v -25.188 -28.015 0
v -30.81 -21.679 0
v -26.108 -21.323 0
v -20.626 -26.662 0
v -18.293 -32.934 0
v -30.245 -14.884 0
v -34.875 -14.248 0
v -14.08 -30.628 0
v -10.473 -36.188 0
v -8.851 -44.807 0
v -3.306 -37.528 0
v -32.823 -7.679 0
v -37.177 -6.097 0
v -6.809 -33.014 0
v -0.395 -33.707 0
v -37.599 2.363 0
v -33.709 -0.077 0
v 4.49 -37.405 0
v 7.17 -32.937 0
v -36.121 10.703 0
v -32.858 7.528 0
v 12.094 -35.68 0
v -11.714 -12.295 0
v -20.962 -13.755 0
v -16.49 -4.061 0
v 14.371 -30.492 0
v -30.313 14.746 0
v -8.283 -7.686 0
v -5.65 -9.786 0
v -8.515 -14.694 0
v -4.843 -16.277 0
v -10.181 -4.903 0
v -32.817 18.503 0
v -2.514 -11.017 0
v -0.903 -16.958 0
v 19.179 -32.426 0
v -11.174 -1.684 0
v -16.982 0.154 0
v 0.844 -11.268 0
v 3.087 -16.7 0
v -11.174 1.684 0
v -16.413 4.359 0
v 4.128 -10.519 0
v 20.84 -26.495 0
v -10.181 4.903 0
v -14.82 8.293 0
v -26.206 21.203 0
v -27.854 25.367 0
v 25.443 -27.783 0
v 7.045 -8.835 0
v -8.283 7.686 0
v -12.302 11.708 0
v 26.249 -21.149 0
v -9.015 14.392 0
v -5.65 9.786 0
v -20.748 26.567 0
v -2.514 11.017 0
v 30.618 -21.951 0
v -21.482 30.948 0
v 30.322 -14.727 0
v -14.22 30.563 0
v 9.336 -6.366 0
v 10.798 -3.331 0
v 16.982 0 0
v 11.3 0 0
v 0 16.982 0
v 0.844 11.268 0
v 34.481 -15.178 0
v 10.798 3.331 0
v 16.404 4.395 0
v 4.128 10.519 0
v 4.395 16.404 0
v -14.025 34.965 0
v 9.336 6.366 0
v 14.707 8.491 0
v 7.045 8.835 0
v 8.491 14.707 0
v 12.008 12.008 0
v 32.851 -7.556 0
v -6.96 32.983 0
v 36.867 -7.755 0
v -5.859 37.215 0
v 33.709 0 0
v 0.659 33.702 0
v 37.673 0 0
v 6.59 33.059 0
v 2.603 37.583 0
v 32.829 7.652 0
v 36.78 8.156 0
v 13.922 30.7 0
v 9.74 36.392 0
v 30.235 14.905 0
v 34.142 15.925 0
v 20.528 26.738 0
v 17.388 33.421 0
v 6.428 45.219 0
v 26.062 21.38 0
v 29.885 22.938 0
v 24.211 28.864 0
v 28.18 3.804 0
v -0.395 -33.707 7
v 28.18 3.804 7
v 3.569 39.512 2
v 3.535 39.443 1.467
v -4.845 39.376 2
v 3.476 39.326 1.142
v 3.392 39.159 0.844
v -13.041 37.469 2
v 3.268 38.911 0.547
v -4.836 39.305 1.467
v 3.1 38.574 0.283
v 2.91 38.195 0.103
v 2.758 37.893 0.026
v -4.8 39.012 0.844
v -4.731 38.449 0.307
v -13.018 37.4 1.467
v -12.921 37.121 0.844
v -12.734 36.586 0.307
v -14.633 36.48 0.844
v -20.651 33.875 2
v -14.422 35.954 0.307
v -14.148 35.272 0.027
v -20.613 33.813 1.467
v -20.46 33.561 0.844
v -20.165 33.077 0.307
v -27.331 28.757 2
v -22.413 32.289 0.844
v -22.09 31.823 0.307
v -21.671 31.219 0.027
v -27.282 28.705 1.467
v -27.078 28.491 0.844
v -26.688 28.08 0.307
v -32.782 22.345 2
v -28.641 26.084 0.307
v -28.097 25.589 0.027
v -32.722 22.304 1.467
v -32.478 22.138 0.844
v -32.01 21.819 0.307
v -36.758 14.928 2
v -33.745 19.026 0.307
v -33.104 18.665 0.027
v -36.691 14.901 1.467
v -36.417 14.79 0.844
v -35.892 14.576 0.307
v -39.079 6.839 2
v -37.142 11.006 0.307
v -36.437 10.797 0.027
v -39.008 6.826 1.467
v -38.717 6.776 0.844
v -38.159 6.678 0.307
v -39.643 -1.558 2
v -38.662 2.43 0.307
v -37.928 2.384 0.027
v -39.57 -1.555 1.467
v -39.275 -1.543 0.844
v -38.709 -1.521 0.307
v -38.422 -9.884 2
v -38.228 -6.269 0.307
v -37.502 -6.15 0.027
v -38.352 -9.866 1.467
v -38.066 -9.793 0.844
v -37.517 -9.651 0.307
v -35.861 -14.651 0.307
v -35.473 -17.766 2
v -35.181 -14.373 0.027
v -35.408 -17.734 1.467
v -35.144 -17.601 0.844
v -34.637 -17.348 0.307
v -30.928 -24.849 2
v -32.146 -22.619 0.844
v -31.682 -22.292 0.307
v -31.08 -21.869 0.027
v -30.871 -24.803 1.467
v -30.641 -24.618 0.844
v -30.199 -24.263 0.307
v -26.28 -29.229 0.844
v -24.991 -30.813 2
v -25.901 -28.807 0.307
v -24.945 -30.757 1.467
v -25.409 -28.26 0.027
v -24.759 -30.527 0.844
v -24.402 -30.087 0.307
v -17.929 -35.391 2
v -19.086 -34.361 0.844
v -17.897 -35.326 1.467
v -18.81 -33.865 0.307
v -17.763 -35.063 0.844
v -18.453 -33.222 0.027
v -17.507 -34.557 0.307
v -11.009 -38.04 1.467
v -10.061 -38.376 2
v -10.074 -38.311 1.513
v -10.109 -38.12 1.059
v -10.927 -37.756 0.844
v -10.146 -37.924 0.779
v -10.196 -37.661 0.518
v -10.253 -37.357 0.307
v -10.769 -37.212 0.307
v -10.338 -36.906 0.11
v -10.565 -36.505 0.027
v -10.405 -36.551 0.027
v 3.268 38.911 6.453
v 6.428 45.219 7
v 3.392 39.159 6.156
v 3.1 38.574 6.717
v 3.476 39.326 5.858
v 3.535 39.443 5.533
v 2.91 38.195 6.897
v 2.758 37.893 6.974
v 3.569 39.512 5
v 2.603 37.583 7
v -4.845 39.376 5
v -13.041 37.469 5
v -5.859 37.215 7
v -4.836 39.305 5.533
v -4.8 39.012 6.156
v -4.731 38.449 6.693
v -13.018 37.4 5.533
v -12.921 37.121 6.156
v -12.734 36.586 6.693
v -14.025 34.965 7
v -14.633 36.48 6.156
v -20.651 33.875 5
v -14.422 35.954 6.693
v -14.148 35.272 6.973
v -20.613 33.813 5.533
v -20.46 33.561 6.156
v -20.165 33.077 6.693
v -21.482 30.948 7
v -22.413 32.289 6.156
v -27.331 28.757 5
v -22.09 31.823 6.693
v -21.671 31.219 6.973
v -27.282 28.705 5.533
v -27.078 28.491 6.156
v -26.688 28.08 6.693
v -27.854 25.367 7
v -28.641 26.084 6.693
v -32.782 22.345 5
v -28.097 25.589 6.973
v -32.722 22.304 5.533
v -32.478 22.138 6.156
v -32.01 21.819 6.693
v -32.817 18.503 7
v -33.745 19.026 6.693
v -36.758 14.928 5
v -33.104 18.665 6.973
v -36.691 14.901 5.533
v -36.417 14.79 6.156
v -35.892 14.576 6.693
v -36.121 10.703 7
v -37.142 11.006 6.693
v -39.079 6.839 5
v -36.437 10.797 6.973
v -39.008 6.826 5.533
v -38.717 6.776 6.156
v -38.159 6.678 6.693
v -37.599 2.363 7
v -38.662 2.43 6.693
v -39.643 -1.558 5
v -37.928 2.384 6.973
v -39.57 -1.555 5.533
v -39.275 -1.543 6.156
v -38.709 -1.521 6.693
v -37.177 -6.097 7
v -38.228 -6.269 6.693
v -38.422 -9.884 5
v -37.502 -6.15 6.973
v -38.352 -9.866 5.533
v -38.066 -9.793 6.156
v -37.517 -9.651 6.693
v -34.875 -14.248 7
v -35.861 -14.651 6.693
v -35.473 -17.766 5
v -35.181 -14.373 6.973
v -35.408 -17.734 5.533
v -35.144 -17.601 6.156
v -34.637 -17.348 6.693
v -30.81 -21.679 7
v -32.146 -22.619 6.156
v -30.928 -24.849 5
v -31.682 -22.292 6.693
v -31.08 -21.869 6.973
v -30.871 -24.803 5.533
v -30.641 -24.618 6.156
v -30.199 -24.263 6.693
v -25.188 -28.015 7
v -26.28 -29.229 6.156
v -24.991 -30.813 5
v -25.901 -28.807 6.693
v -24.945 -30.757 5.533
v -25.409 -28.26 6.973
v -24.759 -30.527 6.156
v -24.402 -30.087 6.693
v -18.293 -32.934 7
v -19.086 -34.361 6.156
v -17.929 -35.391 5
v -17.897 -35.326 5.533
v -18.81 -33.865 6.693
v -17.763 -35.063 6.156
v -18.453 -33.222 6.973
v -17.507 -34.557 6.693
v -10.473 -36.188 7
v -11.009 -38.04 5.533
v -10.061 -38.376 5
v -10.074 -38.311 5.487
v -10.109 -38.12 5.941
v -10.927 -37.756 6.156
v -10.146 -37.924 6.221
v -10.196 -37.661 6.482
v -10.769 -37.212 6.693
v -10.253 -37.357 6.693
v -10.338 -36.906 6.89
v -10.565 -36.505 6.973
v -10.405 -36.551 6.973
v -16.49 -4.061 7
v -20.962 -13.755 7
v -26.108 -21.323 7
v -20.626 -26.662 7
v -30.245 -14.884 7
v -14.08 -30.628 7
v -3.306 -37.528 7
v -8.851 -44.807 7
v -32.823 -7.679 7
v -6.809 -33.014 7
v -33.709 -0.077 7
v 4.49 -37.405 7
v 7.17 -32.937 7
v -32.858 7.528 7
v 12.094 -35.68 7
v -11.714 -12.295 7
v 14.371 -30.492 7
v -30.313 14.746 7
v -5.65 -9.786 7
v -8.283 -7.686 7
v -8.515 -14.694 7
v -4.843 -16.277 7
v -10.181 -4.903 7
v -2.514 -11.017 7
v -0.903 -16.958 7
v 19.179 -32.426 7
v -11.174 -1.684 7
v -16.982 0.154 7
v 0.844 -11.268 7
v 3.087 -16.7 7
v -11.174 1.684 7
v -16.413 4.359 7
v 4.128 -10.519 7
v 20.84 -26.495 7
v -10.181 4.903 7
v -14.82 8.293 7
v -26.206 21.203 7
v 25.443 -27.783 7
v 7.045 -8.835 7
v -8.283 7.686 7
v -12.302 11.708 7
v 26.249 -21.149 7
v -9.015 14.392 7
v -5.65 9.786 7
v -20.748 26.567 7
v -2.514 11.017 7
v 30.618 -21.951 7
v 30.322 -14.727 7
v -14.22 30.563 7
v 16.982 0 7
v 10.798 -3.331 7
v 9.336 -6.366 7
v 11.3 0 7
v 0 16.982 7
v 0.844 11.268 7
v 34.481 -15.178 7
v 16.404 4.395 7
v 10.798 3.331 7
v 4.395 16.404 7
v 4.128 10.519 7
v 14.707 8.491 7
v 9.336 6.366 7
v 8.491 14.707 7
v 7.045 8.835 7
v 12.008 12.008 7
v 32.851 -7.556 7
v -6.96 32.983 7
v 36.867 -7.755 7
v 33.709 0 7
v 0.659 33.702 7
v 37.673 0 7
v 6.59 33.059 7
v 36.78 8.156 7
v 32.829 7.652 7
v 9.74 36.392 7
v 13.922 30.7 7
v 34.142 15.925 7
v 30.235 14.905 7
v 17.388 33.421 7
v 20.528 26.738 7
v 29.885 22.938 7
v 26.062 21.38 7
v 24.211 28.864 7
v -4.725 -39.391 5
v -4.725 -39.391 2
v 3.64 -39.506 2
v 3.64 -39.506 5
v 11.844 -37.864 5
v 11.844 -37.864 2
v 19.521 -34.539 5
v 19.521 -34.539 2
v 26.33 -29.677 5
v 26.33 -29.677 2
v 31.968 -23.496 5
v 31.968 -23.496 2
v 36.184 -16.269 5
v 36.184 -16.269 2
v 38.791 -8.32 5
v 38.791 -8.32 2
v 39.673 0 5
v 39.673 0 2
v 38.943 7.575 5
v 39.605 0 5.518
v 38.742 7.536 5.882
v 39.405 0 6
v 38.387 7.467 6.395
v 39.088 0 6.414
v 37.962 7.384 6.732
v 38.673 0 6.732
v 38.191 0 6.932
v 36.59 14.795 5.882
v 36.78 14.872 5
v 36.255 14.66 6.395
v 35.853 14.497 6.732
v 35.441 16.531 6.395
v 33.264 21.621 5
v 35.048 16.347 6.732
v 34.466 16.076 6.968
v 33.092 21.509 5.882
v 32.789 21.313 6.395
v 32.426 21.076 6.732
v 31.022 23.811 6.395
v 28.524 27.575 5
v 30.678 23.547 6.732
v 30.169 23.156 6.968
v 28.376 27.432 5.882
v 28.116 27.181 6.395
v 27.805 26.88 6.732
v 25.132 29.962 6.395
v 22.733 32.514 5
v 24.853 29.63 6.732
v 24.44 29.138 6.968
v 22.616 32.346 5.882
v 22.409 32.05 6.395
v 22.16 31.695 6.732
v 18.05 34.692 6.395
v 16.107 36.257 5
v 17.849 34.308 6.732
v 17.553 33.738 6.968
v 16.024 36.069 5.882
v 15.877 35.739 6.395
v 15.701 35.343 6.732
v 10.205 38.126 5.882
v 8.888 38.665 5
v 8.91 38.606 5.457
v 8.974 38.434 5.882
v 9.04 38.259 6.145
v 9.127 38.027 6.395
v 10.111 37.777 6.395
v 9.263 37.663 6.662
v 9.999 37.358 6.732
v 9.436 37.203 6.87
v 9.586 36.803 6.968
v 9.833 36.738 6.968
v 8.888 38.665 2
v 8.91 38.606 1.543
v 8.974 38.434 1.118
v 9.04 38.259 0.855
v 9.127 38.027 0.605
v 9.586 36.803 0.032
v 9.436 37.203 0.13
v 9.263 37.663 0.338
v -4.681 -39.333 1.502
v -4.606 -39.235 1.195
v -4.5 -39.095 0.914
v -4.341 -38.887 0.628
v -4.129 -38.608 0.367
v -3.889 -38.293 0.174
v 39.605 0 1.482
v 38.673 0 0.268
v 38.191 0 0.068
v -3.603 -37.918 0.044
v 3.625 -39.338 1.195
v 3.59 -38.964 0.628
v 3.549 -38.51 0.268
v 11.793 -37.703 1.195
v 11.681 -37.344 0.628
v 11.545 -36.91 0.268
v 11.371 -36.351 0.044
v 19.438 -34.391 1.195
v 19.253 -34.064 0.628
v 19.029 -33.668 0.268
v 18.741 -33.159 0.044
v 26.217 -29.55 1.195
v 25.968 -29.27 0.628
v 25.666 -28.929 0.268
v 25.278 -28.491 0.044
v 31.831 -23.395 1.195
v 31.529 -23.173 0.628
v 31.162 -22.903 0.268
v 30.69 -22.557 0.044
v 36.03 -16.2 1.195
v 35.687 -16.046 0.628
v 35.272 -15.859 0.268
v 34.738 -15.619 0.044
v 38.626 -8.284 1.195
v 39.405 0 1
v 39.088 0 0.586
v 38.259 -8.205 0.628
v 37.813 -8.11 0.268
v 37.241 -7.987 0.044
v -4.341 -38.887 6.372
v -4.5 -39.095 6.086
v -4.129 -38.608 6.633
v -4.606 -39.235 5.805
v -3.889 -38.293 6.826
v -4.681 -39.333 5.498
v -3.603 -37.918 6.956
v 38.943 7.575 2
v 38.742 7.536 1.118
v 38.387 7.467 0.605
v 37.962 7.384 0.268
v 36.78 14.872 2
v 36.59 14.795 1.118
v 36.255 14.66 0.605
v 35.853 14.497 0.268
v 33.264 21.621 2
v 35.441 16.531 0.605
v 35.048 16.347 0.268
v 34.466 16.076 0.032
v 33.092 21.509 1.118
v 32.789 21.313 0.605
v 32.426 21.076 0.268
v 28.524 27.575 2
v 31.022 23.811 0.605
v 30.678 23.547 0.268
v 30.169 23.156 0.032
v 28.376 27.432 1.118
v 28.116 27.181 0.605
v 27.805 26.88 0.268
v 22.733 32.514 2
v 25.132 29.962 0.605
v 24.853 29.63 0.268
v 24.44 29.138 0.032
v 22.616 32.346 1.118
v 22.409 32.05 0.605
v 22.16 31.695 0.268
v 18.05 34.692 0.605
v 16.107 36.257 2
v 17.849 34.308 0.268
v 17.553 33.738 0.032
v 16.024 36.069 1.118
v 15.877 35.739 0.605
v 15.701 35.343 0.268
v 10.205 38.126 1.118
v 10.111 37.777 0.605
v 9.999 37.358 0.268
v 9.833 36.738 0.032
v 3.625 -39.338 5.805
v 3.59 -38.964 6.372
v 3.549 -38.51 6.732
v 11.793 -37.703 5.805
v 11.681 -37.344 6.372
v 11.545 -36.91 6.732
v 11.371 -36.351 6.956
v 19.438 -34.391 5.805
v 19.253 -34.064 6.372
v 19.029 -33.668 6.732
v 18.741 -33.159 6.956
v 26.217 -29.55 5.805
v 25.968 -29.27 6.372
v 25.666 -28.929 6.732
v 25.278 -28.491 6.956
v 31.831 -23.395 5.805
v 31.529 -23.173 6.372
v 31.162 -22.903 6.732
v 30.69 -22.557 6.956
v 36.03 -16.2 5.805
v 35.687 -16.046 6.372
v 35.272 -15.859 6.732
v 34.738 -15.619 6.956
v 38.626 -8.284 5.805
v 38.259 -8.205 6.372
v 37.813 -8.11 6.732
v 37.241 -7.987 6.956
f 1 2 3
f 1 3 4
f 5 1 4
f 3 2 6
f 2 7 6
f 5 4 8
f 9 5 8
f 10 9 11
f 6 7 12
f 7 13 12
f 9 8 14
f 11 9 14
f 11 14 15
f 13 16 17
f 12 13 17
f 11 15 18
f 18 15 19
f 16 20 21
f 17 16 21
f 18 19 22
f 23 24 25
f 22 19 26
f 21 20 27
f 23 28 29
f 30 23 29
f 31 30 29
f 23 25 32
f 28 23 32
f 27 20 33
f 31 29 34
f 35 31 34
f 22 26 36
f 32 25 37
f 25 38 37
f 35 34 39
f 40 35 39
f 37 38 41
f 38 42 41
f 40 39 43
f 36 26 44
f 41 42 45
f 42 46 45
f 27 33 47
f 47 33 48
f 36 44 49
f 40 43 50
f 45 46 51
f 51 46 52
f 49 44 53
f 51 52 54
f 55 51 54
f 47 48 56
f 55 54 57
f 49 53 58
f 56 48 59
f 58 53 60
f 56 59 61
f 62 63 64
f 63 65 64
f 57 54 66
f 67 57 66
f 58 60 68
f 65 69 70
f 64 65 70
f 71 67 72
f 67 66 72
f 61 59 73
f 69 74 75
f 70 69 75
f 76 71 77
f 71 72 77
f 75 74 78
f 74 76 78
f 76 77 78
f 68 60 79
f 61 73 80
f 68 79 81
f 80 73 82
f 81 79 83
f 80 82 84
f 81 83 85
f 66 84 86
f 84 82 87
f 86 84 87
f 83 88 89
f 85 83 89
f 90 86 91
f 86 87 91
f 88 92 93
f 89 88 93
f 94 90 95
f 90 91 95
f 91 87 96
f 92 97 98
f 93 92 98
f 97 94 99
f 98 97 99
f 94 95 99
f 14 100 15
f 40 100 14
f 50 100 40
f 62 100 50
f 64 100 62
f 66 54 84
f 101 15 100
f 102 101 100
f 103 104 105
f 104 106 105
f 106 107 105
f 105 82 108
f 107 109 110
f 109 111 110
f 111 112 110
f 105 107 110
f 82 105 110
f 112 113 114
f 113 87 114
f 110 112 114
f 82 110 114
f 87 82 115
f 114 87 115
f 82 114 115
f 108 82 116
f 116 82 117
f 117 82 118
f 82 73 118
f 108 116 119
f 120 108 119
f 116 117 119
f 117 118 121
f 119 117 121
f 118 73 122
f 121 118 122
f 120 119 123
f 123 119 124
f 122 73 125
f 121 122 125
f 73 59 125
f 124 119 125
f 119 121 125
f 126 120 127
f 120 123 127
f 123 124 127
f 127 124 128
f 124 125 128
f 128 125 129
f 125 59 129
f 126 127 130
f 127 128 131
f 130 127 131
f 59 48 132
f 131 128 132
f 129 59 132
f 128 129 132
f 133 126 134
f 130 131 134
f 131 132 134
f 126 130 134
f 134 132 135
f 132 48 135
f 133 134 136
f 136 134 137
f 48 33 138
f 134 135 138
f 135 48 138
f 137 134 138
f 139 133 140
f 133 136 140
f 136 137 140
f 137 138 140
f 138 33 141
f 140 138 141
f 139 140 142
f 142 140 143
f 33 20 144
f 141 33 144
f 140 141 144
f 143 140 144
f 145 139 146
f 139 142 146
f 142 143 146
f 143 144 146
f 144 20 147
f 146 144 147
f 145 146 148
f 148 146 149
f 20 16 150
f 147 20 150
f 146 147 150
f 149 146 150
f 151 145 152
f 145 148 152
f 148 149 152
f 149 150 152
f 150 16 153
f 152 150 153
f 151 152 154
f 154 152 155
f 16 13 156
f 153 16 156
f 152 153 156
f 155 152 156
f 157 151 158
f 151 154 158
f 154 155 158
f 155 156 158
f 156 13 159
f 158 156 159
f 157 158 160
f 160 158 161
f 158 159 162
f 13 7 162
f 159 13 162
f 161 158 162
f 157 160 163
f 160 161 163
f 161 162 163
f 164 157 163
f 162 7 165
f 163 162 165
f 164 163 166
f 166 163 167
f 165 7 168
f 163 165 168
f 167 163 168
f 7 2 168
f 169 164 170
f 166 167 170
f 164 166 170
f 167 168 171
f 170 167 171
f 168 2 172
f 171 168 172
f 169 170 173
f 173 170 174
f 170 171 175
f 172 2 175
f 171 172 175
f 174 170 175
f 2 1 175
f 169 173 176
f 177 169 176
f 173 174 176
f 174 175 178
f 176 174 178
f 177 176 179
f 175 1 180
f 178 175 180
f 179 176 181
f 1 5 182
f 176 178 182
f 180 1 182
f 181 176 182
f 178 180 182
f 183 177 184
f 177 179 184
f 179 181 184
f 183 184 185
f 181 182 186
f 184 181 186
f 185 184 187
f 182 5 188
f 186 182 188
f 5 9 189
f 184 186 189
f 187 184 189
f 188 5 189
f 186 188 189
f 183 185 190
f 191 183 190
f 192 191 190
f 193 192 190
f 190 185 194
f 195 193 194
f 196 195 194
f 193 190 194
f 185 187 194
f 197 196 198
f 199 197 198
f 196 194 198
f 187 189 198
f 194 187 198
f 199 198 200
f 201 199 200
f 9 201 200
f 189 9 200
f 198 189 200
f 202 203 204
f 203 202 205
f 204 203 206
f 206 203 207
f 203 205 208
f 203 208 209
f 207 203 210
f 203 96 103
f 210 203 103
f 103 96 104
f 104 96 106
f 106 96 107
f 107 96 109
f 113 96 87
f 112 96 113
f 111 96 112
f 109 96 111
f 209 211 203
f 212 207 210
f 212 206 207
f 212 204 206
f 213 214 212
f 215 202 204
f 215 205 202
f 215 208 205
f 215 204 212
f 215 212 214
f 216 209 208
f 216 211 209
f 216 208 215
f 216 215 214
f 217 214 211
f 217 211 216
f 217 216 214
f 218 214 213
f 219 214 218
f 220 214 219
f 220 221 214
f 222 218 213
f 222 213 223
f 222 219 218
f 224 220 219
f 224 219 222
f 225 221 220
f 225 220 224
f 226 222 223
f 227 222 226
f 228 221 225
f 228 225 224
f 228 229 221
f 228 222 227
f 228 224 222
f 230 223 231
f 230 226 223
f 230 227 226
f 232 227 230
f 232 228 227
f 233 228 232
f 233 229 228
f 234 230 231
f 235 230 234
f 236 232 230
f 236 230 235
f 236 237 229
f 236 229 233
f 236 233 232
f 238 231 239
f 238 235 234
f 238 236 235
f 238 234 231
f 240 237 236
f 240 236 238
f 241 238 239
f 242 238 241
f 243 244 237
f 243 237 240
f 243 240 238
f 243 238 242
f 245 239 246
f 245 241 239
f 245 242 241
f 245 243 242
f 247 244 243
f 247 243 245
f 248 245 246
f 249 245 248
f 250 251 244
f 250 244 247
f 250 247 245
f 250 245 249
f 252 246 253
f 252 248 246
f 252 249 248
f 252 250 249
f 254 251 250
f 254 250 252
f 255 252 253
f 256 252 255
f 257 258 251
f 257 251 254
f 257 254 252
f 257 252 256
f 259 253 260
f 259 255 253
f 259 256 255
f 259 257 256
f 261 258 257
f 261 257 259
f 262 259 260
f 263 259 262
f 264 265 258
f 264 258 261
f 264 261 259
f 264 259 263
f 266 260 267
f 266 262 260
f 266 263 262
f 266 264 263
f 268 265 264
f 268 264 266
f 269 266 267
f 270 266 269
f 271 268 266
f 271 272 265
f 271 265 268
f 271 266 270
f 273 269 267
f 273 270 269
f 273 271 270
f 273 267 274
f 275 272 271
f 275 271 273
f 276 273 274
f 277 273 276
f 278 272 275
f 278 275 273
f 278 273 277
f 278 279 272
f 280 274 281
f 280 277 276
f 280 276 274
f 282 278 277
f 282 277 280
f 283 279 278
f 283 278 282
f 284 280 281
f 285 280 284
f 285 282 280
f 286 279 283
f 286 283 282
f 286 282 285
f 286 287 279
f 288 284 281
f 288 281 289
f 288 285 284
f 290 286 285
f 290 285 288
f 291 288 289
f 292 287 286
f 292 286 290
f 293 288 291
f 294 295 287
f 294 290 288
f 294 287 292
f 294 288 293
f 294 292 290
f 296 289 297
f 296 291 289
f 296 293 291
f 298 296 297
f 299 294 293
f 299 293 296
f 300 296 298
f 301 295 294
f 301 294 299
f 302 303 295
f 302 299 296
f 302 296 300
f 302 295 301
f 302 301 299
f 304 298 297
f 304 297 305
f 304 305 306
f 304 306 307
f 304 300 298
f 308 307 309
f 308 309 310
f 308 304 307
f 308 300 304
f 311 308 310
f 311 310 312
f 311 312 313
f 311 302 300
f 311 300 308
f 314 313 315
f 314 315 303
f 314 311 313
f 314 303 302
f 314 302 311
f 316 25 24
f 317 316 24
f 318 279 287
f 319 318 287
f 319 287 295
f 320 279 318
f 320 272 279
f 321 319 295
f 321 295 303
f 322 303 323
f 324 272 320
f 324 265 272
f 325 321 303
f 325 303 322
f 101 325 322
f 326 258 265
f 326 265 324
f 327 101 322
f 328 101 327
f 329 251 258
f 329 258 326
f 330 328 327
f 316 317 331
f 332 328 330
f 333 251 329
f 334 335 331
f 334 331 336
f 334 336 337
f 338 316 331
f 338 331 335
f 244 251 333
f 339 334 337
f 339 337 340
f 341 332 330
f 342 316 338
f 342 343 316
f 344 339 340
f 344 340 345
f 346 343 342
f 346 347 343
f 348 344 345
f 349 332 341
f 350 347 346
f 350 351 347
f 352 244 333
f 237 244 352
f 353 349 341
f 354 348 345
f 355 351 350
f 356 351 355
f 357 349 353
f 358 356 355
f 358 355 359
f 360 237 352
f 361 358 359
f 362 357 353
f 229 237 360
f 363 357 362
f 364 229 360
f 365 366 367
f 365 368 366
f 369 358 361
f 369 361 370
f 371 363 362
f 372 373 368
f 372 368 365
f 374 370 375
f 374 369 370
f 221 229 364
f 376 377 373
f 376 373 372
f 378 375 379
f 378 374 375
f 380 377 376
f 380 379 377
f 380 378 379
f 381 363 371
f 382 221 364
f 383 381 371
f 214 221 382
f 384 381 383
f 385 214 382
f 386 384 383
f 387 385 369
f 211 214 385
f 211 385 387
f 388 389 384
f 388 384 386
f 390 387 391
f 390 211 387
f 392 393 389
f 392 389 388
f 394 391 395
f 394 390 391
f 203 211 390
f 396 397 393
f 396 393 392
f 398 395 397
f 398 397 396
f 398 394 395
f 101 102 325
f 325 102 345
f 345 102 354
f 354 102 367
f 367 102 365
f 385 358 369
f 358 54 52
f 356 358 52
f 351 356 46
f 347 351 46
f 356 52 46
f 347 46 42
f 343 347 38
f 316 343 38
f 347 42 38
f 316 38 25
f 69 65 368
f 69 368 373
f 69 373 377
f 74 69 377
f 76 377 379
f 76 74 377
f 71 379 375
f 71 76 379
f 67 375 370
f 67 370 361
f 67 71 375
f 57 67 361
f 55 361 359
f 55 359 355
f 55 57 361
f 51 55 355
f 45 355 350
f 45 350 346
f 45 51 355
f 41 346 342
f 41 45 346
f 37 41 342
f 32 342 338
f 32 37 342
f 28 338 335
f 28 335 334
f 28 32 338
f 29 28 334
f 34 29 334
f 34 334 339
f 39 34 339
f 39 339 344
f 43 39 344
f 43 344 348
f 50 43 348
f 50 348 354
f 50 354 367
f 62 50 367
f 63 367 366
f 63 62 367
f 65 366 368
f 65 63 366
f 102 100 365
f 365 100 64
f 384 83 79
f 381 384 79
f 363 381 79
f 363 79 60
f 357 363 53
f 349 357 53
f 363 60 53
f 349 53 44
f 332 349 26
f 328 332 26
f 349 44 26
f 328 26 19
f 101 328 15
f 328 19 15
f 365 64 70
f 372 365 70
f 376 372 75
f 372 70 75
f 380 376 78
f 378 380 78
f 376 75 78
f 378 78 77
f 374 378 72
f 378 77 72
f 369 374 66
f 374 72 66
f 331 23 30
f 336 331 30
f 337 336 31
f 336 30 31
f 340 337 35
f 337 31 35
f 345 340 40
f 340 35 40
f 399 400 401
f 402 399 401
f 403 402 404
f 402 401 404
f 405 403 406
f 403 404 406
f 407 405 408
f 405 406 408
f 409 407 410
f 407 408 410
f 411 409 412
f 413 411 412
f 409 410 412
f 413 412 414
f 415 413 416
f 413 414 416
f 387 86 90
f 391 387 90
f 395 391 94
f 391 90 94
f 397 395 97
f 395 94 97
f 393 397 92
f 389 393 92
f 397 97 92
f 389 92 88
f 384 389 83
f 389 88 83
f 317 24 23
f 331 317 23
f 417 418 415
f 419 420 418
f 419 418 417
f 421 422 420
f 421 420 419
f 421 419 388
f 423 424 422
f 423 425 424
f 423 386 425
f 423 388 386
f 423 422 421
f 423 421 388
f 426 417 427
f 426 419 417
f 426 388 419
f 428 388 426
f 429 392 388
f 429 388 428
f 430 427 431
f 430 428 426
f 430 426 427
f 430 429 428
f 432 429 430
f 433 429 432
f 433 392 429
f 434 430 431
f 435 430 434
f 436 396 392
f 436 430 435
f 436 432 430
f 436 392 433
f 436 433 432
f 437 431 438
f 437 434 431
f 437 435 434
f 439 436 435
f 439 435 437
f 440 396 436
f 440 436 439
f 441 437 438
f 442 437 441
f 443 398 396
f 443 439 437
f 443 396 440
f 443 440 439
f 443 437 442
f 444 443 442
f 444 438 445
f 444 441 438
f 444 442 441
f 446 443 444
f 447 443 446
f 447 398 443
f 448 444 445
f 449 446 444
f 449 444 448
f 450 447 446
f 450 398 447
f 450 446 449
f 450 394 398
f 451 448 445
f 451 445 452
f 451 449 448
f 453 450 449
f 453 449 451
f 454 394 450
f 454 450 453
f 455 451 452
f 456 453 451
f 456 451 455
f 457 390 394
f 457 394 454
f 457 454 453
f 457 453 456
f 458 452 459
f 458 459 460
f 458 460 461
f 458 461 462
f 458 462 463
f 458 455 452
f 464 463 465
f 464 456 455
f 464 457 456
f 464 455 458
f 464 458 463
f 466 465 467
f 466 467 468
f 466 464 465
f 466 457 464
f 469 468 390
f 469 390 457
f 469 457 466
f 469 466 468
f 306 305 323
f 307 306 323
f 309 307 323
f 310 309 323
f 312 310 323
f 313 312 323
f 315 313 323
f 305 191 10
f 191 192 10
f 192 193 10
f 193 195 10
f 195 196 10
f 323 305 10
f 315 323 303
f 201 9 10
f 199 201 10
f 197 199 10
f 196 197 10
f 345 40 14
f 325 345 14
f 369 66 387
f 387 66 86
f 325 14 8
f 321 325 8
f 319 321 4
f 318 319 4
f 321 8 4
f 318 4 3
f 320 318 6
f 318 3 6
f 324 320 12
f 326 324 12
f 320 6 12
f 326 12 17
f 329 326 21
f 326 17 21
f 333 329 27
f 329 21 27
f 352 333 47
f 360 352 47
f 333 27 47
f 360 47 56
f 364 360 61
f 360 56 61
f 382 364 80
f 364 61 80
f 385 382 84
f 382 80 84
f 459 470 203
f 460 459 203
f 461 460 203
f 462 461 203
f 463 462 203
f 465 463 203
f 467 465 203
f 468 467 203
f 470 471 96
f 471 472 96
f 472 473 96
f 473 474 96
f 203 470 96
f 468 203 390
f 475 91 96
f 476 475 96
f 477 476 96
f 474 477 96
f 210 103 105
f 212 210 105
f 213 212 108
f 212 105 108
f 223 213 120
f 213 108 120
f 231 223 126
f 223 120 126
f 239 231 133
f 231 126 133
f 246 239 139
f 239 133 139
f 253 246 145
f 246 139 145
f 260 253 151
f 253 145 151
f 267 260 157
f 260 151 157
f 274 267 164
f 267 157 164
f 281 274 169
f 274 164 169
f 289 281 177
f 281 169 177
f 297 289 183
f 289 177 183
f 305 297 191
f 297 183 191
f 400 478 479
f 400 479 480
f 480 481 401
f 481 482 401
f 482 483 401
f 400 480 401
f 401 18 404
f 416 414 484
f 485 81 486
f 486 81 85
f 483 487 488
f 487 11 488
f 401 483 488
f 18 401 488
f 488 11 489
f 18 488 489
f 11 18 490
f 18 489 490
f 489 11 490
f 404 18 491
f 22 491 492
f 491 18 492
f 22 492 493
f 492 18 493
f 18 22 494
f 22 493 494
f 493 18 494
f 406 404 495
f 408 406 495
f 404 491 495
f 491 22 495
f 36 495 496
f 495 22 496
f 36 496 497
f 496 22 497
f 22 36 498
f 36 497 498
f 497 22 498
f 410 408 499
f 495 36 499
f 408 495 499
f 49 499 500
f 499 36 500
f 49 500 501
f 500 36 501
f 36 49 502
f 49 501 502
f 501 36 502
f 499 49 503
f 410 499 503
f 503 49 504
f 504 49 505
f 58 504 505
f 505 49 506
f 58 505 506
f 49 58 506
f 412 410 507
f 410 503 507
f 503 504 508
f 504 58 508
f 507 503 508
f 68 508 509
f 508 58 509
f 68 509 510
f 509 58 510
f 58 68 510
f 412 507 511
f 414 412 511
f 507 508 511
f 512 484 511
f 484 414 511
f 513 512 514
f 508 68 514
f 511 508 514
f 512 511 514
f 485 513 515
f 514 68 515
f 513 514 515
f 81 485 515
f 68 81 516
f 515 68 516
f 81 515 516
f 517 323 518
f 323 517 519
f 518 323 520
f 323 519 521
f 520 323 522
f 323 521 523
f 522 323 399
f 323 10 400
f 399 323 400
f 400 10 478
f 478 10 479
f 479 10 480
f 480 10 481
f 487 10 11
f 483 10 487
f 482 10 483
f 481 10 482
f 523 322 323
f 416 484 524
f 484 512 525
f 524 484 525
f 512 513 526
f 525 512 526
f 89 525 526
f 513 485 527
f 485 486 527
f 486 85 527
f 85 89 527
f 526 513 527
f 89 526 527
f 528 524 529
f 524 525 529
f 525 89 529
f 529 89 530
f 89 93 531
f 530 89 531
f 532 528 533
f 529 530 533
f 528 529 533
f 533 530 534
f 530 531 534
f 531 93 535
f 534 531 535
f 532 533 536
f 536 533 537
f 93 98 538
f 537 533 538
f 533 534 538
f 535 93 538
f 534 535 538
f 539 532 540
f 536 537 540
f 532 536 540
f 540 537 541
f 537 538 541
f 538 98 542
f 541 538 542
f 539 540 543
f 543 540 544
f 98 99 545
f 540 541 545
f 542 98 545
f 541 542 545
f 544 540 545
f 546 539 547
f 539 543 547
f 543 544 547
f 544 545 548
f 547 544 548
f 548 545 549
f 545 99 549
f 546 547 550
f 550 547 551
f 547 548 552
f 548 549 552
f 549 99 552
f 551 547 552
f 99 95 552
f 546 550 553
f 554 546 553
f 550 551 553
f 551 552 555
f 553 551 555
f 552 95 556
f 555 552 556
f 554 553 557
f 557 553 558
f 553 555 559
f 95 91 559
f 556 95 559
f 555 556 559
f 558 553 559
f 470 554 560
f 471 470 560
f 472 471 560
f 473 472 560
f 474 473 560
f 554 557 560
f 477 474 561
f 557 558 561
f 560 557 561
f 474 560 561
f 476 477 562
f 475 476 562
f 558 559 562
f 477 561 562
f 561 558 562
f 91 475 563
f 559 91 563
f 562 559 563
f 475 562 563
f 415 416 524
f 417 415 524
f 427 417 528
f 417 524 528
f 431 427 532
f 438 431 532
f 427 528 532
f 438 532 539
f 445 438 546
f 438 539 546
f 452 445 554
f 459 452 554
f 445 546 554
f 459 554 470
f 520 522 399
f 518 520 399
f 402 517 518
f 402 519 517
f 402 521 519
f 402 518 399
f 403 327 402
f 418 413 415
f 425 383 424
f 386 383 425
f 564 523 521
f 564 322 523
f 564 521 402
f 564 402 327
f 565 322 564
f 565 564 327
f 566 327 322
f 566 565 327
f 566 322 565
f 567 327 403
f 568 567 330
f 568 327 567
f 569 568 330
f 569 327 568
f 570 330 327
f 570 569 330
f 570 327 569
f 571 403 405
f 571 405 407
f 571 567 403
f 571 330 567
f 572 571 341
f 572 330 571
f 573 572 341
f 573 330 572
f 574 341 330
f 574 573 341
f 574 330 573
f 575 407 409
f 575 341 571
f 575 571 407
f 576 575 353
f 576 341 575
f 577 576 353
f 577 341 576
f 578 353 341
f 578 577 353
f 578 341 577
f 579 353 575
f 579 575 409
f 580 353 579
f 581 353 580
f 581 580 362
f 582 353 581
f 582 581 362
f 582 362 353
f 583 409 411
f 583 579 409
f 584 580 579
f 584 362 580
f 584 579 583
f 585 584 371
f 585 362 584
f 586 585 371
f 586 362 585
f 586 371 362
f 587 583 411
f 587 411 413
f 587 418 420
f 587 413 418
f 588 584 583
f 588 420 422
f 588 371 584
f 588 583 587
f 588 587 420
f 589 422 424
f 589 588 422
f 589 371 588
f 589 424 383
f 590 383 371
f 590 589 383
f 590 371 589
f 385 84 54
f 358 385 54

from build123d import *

# Parameters (mm, degrees)
F0_R     = 11.3
F1_DEPTH = 7
F2_R     = 2


# Not quite as in the source:
# - a feature names something its author has since deleted; it is built from what else it names


with BuildPart() as f1:
    # F0 (on Top) → F1 (new body)
    with BuildSketch(Plane.XY):
        with BuildLine():
            Line((8.8875694593, 38.6650469228), (6.5895106012, 33.0585853257))
            ThreePointArc((6.5895106012, 33.0585853257), (26.0616292761, 21.3795040442), (33.7089263208, 0))
            ThreePointArc((33.7089263208, 0), (23.6957200597, -23.9750821594), (-0.3950708864, -33.7066111126))
            Line((-0.3950708864, -33.7066111126), (-4.7252705017, -39.390945192))
            ThreePointArc((-4.7252705017, -39.390945192), (26.3297116519, -29.6769443973), (39.6733505572, 0))
            ThreePointArc((39.6733505572, 0), (31.0368684244, 24.7120930485), (8.8875694593, 38.6650469228))
        make_face()
        with BuildLine():
            ThreePointArc((0.6589035842, 33.7024859583), (3.6384789483, 33.5119856864), (6.5895106012, 33.0585853257))
            Line((6.5895106012, 33.0585853257), (8.8875694593, 38.6650469228))
            ThreePointArc((8.8875694593, 38.6650469228), (6.2429099817, 39.1790865053), (3.5694610238, 39.5124498409))
            Line((3.5694610238, 39.5124498409), (0.6589035842, 33.7024859583))
        make_face()
        with BuildLine():
            Line((-10.061211071, -38.3763830528), (-6.8087075048, -33.0141366056))
            ThreePointArc((-6.8087075048, -33.0141366056), (-33.4997306504, 3.7496346558), (0.6589035842, 33.7024859583))
            Line((0.6589035842, 33.7024859583), (3.5694610238, 39.5124498409))
            ThreePointArc((3.5694610238, 39.5124498409), (-39.0794482696, 6.8389668354), (-10.061211071, -38.3763830528))
        make_face()
        with BuildLine():
            ThreePointArc((-0.3950708864, -33.7066111126), (-3.6184922292, -33.5141496638), (-6.8087075048, -33.0141366056))
            Line((-6.8087075048, -33.0141366056), (-10.061211071, -38.3763830528))
            ThreePointArc((-10.061211071, -38.3763830528), (-7.4106236855, -38.9750869277), (-4.7252705017, -39.390945192))
            Line((-4.7252705017, -39.390945192), (-0.3950708864, -33.7066111126))
        make_face()
        with BuildLine():
            ThreePointArc((3.5694610238, 39.5124498409), (6.2429099817, 39.1790865053), (8.8875694593, 38.6650469228))
            Line((8.8875694593, 38.6650469228), (6.4280834783, 45.2187427282))
            Line((6.4280834783, 45.2187427282), (3.5694610238, 39.5124498409))
        make_face()
        with BuildLine():
            ThreePointArc((-4.7252705017, -39.390945192), (-7.4106236855, -38.9750869277), (-10.061211071, -38.3763830528))
            Line((-10.061211071, -38.3763830528), (-8.8514386924, -44.8074434017))
            Line((-8.8514386924, -44.8074434017), (-4.7252705017, -39.390945192))
        make_face()
        with BuildLine():
            ThreePointArc((-9.0146919562, 14.392356585), (-4.6897069772, 16.3221091653), (0, 16.9824791811))
            Line((0, 16.9824791811), (6.5895106012, 33.0585853257))
            ThreePointArc((6.5895106012, 33.0585853257), (3.6384789483, 33.5119856864), (0.6589035842, 33.7024859583))
            Line((0.6589035842, 33.7024859583), (-9.0146919562, 14.392356585))
        make_face()
        with BuildLine():
            ThreePointArc((3.0870048037, -16.6995509065), (13.054301857, -10.8623110875), (16.9824791811, 0))
            ThreePointArc((16.9824791811, 0), (12.0084261903, 12.0084261903), (0, 16.9824791811))
            ThreePointArc((0, 16.9824791811), (-4.6897069772, 16.3221091653), (-9.0146919562, 14.392356585))
            ThreePointArc((-9.0146919562, 14.392356585), (-15.7401759471, 6.37584977), (-16.4896996402, -4.0613304363))
            ThreePointArc((-16.4896996402, -4.0613304363), (-14.690740637, -8.5197851306), (-11.7143980752, -12.2954250382))
            ThreePointArc((-11.7143980752, -12.2954250382), (-4.8432488922, -16.2772091989), (3.0870048037, -16.6995509065))
        make_face()
        Circle(F0_R, mode=Mode.SUBTRACT)
        with BuildLine():
            Line((-20.9624820809, -13.7546608704), (-11.7143980752, -12.2954250382))
            ThreePointArc((-11.7143980752, -12.2954250382), (-14.690740637, -8.5197851306), (-16.4896996402, -4.0613304363))
            Line((-16.4896996402, -4.0613304363), (-20.9624820809, -13.7546608704))
        make_face()
        with BuildLine():
            Line((28.1798244973, 3.8041888679), (16.9824791811, 0))
            ThreePointArc((16.9824791811, 0), (13.054301857, -10.8623110875), (3.0870048037, -16.6995509065))
            Line((3.0870048037, -16.6995509065), (-6.8087075048, -33.0141366056))
            ThreePointArc((-6.8087075048, -33.0141366056), (-3.6184922292, -33.5141496638), (-0.3950708864, -33.7066111126))
            Line((-0.3950708864, -33.7066111126), (28.1798244973, 3.8041888679))
        make_face()
    extrude(amount=F1_DEPTH)

    # F2
    f2_edges = [f1.edges().sort_by_distance(p)[0] for p in [
        (39.083445, -6.81609, 7),
        (39.083445, -6.81609, 0),
        (-39.079448, 6.838967, 0),
        (-39.079448, 6.838967, 7),
    ]]
    fillet(f2_edges, radius=F2_R)


solid = f1.part
